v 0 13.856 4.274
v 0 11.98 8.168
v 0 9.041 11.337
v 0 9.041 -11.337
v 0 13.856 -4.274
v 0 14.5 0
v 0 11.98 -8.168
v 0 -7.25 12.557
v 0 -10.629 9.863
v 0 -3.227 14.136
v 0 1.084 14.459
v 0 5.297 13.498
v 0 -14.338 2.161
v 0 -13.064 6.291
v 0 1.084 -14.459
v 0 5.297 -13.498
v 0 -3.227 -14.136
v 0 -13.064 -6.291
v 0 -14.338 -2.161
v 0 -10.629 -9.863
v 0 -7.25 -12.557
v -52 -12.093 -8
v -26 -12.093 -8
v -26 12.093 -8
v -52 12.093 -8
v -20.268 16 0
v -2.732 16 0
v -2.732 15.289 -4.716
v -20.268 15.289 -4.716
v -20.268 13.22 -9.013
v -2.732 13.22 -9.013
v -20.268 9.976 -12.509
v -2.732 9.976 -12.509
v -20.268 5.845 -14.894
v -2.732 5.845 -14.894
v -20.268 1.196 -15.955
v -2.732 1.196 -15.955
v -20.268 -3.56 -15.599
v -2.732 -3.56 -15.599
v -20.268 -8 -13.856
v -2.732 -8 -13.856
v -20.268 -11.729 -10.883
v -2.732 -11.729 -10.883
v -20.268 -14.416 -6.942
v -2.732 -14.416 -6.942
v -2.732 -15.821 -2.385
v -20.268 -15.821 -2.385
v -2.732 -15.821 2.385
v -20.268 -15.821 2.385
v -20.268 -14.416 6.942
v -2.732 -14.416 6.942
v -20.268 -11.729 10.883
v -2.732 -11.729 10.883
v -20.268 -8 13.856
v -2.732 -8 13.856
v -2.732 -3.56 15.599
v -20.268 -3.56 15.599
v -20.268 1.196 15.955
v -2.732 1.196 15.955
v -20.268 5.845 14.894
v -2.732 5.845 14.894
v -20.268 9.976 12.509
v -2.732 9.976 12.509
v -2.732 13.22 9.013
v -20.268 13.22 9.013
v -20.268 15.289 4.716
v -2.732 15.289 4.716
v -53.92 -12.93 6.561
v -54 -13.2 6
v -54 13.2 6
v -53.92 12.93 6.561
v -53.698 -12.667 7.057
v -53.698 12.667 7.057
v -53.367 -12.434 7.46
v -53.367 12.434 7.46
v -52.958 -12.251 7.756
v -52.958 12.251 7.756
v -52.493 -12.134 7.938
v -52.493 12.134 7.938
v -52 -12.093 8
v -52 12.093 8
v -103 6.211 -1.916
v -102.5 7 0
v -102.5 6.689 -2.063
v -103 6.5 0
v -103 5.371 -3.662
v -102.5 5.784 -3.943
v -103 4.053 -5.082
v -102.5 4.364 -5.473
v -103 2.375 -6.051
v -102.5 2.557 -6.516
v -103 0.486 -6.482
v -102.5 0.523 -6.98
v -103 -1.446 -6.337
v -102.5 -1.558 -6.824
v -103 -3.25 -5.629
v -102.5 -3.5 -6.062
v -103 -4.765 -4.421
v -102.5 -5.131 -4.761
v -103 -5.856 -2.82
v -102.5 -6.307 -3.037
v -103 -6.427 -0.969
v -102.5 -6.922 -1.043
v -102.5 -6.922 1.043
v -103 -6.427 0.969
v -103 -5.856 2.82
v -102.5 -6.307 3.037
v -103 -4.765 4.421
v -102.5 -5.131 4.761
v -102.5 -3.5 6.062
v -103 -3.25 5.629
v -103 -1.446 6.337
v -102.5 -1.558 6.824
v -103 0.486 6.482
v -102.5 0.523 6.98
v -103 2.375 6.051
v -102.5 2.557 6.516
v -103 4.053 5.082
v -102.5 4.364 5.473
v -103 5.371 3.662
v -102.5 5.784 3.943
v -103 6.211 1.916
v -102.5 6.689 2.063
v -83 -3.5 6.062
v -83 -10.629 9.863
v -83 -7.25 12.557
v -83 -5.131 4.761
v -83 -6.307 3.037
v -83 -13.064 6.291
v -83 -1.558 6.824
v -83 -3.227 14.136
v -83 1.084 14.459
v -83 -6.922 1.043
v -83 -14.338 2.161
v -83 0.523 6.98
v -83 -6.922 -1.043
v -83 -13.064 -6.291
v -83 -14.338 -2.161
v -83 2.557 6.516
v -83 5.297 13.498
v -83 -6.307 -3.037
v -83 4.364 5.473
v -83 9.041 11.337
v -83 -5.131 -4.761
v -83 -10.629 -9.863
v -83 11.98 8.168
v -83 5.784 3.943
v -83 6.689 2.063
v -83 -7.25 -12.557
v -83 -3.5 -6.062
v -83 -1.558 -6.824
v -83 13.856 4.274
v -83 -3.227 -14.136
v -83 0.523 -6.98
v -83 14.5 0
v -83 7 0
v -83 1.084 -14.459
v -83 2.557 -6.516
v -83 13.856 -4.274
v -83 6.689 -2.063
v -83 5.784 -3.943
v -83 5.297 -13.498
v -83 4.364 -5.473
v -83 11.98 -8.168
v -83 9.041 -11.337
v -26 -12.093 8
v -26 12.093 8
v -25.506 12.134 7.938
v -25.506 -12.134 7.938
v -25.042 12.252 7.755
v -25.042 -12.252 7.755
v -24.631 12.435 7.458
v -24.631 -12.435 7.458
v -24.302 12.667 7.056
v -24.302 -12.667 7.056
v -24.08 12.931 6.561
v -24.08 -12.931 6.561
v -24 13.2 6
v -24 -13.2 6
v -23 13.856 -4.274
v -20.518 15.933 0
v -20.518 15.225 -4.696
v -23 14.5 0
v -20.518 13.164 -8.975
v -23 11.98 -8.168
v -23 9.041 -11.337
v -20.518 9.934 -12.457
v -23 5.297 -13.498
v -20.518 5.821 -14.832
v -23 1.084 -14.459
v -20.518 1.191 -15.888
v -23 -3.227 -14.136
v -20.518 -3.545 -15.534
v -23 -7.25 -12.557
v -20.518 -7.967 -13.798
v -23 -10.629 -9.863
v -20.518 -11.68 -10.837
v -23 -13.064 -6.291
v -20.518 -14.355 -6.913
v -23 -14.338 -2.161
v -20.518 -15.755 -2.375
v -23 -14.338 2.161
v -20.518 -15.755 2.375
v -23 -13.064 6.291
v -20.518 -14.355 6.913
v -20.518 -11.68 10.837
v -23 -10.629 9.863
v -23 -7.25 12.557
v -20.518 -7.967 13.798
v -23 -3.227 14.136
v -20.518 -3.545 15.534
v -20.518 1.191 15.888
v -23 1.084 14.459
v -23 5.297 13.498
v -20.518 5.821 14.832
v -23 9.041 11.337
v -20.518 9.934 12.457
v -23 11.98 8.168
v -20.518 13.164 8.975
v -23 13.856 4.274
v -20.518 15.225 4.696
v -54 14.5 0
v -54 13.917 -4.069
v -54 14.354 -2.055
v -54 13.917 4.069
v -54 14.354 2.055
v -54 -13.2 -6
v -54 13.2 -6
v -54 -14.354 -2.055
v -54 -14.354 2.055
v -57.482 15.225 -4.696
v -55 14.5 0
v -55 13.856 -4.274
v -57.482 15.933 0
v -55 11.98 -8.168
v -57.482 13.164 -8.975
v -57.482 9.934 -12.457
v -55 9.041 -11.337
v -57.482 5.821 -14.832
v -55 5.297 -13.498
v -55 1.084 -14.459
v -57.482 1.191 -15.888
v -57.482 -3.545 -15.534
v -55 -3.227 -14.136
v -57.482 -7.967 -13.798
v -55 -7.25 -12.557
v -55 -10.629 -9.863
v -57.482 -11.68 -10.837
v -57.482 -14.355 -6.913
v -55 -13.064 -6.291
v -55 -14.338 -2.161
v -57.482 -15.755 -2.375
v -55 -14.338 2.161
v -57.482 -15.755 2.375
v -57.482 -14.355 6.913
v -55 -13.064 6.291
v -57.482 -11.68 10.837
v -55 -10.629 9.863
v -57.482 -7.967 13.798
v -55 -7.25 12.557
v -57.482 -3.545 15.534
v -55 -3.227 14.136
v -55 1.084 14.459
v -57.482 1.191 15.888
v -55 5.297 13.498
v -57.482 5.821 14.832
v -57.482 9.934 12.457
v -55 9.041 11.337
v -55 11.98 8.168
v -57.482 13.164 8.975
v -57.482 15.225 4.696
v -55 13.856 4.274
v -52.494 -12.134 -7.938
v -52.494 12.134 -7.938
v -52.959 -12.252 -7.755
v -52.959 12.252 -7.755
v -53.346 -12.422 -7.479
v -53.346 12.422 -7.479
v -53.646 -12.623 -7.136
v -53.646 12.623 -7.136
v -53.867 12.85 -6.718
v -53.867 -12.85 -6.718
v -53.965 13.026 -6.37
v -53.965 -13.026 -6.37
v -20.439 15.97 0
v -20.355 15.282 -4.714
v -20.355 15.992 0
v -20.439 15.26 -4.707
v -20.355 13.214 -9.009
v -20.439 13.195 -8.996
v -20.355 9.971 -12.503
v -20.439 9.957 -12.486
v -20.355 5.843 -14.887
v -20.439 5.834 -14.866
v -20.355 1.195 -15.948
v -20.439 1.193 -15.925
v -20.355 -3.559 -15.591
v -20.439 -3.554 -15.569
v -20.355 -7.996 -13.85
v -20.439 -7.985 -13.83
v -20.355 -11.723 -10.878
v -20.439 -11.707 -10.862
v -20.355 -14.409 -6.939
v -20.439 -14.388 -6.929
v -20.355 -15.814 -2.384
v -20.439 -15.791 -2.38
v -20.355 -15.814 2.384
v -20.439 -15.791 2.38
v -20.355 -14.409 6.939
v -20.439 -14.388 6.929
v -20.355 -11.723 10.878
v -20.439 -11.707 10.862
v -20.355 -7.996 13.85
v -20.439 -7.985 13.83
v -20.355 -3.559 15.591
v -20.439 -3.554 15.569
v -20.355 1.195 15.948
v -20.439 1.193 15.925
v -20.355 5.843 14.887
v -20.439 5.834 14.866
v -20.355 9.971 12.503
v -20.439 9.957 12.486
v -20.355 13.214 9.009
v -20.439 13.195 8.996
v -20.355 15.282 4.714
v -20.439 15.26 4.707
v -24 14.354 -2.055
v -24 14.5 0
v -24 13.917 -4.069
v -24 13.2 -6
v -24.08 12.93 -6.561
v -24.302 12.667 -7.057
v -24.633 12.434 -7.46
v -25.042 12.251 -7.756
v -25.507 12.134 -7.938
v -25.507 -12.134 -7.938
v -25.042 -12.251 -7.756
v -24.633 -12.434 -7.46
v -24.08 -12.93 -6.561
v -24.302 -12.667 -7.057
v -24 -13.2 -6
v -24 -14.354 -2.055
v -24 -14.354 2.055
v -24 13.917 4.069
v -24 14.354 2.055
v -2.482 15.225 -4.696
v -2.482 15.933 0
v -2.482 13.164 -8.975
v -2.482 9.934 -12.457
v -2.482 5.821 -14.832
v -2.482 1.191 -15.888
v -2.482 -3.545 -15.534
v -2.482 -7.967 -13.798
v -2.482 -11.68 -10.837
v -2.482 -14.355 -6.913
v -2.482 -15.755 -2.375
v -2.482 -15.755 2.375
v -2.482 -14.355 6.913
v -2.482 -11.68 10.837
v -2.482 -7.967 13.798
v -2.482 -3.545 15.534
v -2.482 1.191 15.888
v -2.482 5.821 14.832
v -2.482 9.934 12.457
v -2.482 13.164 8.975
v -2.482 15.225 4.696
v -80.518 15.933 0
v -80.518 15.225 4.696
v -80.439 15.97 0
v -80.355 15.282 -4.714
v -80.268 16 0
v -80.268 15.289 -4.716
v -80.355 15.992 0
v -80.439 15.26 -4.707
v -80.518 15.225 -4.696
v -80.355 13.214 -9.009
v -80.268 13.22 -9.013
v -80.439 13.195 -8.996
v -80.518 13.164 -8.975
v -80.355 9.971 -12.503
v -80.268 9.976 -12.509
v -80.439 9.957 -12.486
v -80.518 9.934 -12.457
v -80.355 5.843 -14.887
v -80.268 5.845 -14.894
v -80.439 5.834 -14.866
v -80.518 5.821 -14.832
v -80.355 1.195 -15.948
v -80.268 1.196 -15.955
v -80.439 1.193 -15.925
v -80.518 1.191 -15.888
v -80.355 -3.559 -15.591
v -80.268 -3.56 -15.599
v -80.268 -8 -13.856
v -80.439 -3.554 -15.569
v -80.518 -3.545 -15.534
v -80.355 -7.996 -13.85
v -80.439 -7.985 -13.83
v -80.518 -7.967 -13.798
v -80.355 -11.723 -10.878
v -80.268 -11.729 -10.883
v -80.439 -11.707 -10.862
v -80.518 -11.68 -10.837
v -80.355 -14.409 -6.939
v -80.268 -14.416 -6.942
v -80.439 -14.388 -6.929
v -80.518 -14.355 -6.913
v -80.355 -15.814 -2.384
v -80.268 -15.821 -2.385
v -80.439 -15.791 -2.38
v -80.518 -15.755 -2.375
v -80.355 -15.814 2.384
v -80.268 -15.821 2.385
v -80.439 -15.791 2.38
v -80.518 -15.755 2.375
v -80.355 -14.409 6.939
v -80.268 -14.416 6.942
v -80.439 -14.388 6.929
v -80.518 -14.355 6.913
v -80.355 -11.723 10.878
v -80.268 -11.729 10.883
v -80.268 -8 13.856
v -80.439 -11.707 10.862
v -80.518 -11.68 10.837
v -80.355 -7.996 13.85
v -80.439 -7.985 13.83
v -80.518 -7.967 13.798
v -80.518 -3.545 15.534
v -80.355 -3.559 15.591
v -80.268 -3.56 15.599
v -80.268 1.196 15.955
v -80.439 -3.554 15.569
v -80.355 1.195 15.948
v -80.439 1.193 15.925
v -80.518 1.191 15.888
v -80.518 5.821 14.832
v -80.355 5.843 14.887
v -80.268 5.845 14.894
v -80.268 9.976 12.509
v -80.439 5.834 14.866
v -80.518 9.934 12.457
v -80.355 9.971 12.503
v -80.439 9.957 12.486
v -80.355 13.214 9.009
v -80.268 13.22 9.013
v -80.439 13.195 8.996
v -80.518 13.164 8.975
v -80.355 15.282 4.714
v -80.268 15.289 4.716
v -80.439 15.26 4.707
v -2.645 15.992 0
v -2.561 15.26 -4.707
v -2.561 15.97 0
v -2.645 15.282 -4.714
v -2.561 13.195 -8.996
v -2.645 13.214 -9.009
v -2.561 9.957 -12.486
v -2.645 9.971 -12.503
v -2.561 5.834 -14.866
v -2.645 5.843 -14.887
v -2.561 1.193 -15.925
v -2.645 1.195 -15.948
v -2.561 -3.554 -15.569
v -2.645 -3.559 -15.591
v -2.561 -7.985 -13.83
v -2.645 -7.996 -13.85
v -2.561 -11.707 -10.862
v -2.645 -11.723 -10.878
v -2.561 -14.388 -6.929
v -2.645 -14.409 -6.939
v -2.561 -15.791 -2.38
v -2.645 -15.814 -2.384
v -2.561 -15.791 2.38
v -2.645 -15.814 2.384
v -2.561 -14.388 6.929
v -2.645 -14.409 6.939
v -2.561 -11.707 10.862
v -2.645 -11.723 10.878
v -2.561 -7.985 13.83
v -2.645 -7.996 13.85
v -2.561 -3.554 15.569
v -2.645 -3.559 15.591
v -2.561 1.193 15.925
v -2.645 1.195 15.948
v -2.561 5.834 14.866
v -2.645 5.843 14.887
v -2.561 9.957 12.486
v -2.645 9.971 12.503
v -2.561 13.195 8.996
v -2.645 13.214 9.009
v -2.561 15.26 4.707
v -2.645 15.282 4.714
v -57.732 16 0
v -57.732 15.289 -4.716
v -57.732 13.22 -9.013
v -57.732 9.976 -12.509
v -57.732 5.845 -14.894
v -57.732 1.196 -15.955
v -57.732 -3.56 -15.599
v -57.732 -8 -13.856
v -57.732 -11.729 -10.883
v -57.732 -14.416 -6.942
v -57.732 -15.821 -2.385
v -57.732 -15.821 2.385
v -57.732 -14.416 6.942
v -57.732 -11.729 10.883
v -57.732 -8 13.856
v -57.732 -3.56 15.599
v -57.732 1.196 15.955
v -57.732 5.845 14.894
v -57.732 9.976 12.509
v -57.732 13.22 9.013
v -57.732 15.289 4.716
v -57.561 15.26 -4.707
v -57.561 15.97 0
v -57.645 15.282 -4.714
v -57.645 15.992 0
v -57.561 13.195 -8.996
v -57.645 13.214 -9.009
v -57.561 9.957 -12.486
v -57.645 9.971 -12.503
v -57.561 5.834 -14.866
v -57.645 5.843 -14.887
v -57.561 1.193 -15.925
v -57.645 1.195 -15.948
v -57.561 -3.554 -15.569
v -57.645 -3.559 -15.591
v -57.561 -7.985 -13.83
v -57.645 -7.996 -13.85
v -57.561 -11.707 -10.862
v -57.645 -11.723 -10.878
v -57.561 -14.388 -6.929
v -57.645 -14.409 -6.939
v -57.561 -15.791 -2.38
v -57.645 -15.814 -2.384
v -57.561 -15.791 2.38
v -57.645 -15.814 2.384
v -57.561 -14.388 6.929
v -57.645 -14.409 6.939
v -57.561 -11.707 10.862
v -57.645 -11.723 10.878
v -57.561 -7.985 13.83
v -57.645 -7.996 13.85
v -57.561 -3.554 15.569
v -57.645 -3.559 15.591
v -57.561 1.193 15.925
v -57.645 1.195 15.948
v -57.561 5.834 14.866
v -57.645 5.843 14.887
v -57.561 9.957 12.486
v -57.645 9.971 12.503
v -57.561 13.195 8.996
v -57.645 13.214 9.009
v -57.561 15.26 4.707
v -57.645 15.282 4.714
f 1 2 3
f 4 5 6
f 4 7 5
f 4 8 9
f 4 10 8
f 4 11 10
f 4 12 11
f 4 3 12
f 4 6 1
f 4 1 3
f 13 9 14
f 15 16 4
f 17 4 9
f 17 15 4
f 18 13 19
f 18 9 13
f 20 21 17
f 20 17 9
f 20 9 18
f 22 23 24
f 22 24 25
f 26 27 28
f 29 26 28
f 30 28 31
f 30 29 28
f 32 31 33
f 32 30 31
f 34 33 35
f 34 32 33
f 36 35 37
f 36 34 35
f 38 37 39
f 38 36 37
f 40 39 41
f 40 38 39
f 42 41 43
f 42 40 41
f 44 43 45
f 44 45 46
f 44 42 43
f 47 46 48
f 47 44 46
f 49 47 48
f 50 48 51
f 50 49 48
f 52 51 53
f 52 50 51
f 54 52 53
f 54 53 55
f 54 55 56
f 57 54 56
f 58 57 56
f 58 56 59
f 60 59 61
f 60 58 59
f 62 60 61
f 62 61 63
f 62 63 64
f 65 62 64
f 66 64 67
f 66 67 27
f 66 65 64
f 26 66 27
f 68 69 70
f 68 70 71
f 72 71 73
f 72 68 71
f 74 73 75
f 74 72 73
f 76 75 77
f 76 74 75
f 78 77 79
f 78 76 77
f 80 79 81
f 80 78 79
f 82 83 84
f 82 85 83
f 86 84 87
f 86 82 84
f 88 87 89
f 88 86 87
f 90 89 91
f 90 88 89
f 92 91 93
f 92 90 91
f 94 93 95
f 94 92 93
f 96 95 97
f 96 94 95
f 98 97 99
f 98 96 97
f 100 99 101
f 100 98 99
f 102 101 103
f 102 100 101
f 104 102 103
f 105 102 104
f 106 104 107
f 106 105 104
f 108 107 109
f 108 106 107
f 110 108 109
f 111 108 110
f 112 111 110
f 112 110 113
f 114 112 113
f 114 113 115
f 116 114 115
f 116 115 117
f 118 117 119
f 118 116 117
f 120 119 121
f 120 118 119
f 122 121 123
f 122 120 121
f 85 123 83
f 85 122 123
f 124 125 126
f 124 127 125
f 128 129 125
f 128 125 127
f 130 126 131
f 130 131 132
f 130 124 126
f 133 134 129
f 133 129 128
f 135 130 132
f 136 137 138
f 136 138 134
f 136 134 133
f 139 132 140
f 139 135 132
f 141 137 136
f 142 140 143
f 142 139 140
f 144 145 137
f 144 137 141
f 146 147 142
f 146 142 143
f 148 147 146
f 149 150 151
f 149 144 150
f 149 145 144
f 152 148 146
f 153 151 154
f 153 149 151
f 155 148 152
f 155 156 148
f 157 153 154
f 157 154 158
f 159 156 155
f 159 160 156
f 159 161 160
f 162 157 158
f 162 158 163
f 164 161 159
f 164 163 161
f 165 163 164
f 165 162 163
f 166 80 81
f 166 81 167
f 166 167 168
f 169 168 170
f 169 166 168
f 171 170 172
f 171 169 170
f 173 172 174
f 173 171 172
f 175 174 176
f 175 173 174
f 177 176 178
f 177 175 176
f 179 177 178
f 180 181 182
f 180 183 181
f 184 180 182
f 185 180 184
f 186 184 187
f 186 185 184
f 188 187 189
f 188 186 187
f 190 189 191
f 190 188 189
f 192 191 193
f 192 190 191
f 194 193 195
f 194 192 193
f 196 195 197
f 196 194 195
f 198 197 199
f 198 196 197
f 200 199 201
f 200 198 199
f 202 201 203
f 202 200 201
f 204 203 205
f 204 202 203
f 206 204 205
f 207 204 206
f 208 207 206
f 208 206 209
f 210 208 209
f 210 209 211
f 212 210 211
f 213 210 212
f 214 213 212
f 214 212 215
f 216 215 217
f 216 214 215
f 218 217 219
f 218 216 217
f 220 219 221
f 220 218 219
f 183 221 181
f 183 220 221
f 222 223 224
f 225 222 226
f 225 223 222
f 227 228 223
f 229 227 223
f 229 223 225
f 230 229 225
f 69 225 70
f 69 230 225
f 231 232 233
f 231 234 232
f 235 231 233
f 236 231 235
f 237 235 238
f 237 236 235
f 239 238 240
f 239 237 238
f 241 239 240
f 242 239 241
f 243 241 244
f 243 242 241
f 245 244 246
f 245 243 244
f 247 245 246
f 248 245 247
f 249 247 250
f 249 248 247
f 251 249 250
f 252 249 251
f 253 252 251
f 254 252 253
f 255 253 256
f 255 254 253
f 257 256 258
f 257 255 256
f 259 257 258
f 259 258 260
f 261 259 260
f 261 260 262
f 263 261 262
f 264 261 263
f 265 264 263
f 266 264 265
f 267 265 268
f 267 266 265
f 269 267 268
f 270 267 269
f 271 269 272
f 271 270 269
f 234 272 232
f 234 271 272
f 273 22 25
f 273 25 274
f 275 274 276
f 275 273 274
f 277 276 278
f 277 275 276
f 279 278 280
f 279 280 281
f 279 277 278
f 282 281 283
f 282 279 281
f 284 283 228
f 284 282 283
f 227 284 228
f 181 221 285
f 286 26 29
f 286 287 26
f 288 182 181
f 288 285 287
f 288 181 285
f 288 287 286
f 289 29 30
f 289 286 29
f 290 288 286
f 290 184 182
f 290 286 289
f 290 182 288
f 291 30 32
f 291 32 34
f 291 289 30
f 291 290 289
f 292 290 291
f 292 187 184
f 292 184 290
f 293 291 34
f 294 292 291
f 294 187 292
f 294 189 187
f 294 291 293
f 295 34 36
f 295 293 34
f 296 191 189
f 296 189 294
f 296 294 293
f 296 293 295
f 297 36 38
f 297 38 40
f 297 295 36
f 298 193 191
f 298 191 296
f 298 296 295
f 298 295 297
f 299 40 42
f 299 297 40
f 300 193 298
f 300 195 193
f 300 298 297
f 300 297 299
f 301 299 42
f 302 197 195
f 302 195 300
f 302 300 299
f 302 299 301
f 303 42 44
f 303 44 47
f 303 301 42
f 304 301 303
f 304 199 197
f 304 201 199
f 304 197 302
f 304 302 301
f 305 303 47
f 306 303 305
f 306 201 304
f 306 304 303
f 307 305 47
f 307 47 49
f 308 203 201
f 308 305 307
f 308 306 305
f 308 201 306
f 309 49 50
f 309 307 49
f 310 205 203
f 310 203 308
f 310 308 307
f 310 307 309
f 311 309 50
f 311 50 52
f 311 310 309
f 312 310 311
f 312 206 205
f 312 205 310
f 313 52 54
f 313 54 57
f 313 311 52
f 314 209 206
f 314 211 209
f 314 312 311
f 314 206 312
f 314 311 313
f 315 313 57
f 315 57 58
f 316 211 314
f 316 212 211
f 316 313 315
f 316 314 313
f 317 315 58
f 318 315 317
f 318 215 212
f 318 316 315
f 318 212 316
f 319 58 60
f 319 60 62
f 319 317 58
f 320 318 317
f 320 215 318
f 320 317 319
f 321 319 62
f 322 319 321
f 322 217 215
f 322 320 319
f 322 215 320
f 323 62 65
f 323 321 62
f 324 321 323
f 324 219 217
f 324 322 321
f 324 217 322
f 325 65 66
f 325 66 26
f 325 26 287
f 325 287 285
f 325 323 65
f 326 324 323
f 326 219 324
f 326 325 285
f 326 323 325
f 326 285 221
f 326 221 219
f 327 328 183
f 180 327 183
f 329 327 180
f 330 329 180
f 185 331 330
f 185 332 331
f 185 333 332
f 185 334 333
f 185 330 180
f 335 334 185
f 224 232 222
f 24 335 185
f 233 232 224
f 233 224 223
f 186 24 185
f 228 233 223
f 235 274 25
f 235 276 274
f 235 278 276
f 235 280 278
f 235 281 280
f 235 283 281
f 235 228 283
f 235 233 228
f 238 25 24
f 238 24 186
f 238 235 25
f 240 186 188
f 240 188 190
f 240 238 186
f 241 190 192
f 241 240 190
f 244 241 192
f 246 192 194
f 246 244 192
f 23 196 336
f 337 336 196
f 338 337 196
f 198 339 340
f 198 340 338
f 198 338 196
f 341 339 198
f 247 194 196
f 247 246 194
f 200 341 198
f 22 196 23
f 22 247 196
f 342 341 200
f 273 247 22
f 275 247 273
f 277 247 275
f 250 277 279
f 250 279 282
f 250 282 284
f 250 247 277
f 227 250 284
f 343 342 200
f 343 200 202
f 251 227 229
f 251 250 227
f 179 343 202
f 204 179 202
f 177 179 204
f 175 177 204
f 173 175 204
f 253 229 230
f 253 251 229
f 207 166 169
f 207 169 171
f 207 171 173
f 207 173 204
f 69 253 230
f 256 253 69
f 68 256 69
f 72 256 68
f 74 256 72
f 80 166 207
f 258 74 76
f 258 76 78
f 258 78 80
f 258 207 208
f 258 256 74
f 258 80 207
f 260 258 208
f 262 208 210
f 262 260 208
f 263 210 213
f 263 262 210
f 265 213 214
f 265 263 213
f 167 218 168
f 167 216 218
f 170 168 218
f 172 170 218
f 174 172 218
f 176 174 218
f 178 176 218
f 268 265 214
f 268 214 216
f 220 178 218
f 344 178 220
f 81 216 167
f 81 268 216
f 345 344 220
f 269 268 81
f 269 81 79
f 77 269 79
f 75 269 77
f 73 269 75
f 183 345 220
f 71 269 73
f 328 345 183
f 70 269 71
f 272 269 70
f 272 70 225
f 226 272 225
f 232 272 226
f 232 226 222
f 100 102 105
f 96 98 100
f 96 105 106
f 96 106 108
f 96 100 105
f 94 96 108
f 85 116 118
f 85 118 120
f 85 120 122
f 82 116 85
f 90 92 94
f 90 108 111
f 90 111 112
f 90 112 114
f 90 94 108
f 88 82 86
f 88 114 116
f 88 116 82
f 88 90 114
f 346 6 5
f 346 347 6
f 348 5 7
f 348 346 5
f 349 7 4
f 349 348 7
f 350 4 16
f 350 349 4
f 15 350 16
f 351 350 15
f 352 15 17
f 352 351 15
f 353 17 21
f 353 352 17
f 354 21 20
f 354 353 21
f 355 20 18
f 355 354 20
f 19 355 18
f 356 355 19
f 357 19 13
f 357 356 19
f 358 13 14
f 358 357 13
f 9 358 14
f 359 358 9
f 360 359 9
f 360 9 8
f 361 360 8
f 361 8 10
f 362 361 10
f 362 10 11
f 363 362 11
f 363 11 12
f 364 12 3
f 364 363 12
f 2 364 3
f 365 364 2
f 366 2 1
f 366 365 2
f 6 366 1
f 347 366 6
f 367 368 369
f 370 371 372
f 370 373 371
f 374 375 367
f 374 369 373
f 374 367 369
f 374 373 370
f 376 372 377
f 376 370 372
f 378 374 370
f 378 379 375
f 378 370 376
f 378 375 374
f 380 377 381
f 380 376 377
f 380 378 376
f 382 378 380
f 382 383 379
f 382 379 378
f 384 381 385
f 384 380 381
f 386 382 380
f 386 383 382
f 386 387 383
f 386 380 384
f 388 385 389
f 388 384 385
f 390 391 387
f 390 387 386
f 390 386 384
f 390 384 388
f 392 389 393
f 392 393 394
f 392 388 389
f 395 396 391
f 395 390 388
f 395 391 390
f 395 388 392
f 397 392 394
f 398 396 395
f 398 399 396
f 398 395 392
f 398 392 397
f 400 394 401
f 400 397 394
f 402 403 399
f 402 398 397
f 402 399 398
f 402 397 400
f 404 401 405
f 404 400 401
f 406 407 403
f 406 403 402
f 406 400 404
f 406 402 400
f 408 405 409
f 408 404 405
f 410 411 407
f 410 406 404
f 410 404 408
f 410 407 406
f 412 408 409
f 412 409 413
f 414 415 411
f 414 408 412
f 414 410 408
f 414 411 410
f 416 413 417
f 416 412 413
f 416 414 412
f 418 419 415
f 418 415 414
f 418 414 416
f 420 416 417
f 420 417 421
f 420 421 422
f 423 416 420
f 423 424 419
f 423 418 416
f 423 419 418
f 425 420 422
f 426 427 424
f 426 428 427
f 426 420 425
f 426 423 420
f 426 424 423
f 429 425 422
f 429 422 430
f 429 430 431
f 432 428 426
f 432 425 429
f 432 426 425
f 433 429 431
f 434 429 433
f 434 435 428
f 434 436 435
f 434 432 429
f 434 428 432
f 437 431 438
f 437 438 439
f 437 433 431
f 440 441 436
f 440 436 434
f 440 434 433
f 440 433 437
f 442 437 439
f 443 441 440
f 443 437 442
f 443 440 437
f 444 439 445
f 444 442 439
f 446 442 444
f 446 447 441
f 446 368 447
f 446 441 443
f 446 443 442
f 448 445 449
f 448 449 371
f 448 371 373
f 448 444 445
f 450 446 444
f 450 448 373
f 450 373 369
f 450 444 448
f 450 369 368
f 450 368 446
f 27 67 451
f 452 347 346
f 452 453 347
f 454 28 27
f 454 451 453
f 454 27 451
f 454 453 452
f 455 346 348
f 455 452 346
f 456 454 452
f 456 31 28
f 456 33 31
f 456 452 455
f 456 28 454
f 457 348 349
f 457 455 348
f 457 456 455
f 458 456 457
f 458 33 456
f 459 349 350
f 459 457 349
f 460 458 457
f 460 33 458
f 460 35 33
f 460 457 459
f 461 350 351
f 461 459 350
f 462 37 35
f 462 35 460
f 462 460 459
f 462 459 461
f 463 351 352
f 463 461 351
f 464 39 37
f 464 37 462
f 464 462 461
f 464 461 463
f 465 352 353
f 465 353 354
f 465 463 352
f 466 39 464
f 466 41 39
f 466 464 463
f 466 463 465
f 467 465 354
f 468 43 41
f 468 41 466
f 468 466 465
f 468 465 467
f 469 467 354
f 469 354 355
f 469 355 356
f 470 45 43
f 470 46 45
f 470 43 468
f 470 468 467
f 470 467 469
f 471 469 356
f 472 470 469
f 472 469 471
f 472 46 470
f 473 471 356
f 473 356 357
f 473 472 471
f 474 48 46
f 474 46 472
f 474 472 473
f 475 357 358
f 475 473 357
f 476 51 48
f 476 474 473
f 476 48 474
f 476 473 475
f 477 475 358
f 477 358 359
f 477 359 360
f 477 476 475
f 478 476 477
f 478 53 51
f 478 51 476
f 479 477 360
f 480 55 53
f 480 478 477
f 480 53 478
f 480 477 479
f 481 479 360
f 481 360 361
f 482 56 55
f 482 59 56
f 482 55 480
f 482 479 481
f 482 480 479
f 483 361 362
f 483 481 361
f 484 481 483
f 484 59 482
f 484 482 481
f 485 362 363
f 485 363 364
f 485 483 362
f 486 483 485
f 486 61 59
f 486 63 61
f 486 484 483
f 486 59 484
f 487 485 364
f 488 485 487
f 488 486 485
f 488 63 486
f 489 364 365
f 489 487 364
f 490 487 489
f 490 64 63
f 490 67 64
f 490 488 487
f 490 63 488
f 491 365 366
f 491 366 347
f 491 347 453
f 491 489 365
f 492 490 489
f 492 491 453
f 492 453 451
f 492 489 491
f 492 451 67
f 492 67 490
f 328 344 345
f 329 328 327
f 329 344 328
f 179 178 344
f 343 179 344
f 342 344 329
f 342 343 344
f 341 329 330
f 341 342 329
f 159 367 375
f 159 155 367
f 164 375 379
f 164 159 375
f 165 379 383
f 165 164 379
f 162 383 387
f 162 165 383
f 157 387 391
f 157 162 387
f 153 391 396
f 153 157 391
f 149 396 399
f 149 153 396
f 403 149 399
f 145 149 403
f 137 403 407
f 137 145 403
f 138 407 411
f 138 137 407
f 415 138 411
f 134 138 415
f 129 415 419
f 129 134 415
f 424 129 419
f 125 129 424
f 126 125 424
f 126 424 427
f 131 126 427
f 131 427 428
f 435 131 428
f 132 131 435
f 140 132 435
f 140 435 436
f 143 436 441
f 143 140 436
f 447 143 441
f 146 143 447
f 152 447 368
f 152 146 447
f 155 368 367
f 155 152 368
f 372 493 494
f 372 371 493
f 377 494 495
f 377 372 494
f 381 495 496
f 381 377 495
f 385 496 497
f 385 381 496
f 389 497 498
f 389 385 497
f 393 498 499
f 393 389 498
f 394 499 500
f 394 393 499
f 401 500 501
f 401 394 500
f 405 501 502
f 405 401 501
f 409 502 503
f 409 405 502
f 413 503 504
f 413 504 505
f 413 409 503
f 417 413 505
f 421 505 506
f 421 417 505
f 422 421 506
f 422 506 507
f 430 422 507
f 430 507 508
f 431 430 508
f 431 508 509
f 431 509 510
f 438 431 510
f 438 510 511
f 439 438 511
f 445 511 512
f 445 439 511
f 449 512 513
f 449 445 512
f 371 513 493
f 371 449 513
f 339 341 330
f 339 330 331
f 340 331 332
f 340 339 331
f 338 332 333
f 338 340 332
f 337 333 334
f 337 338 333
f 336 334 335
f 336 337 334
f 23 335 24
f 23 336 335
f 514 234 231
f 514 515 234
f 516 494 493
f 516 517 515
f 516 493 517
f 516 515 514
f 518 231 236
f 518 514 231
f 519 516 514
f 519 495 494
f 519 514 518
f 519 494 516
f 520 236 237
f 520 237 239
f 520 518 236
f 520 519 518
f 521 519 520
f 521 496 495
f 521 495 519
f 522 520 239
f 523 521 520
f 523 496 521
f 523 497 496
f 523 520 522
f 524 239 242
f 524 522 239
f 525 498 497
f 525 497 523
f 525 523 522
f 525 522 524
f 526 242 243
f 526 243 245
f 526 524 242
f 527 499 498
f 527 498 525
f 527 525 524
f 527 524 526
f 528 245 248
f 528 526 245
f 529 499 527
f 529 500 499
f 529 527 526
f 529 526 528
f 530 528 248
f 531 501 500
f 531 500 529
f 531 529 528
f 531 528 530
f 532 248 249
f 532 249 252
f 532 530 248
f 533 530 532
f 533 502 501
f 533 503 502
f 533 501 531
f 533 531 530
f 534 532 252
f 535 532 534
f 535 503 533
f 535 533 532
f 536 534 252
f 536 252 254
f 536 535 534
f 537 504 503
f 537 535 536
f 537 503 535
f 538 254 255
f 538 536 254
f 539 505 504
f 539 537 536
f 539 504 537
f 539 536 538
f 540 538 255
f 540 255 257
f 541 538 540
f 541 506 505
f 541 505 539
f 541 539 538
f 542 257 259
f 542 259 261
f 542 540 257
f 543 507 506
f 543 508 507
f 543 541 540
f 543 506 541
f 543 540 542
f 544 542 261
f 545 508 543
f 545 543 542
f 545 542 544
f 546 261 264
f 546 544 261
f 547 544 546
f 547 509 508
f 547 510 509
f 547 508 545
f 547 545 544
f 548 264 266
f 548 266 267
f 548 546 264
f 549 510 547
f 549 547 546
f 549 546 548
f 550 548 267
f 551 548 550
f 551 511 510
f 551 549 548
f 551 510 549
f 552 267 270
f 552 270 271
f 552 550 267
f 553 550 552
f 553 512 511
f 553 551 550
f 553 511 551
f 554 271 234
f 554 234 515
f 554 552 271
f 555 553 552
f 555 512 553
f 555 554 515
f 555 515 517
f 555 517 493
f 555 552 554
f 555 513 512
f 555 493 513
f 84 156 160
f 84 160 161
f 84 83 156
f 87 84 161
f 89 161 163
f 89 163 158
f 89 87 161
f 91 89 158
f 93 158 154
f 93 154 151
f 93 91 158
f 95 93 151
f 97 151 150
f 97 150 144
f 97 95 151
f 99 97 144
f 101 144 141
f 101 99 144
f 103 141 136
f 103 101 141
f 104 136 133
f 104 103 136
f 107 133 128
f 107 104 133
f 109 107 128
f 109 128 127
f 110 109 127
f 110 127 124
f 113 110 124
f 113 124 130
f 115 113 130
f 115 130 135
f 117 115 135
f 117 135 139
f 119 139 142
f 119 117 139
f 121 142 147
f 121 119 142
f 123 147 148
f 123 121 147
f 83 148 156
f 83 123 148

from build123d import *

# Parameters (mm, degrees)
CUT_EXTRUDE_1_DEPTH      = 106.456152041
CUT_EXTRUDE_1_DEPTH_BACK = 106.456152041


with BuildPart() as part:
    # Эскиз1 → Повернуть1 (revolve)
    with BuildSketch(Plane.XY):
        with BuildLine():
            Line((0, 0), (0, 14.5))
            Line((0, 14.5), (-2.482050808, 15.933012702))
            ThreePointArc((-2.482050808, 15.933012702), (-2.602641285, 15.982962913), (-2.732050808, 16))
            Line((-2.732050808, 16), (-20.267949192, 16))
            ThreePointArc((-20.267949192, 16), (-20.397358715, 15.982962913), (-20.517949192, 15.933012702))
            Line((-20.517949192, 15.933012702), (-23, 14.5))
            Line((-23, 14.5), (-55, 14.5))
            Line((-55, 14.5), (-57.482050808, 15.933012702))
            ThreePointArc((-57.482050808, 15.933012702), (-57.602641285, 15.982962913), (-57.732050808, 16))
            Line((-57.732050808, 16), (-80.267949192, 16))
            ThreePointArc((-80.267949192, 16), (-80.397358715, 15.982962913), (-80.517949192, 15.933012702))
            Line((-80.517949192, 15.933012702), (-83, 14.5))
            Line((-83, 14.5), (-83, 7))
            Line((-83, 7), (-102.5, 7))
            Line((-102.5, 7), (-103, 6.5))
            Line((-103, 6.5), (-103, 0))
            Line((-103, 0), (0, 0))
        make_face()
    revolve(axis=Axis((0, 0, 0), (-1, 0, 0)))

    # Эскиз2 → Вырез-Вытянуть1 (cut, two sides: drawn at the far end of the back side and taken through both)
    with BuildSketch(Plane(origin=(0, 0, 0), x_dir=(1, 0, 0), z_dir=(0, 1, 0)).offset(-CUT_EXTRUDE_1_DEPTH_BACK)):
        with BuildLine():
            Line((-52, -8), (-26, -8))
            ThreePointArc((-26, -8), (-24.585786438, -7.414213562), (-24, -6))
            Line((-24, -6), (-24, 6))
            ThreePointArc((-24, 6), (-24.585786438, 7.414213562), (-26, 8))
            Line((-26, 8), (-52, 8))
            ThreePointArc((-52, 8), (-53.414213562, 7.414213562), (-54, 6))
            Line((-54, 6), (-54, -6))
            ThreePointArc((-54, -6), (-53.414213562, -7.414213562), (-52, -8))
        make_face()
    extrude(amount=CUT_EXTRUDE_1_DEPTH + CUT_EXTRUDE_1_DEPTH_BACK, mode=Mode.SUBTRACT)


solid = part.part
